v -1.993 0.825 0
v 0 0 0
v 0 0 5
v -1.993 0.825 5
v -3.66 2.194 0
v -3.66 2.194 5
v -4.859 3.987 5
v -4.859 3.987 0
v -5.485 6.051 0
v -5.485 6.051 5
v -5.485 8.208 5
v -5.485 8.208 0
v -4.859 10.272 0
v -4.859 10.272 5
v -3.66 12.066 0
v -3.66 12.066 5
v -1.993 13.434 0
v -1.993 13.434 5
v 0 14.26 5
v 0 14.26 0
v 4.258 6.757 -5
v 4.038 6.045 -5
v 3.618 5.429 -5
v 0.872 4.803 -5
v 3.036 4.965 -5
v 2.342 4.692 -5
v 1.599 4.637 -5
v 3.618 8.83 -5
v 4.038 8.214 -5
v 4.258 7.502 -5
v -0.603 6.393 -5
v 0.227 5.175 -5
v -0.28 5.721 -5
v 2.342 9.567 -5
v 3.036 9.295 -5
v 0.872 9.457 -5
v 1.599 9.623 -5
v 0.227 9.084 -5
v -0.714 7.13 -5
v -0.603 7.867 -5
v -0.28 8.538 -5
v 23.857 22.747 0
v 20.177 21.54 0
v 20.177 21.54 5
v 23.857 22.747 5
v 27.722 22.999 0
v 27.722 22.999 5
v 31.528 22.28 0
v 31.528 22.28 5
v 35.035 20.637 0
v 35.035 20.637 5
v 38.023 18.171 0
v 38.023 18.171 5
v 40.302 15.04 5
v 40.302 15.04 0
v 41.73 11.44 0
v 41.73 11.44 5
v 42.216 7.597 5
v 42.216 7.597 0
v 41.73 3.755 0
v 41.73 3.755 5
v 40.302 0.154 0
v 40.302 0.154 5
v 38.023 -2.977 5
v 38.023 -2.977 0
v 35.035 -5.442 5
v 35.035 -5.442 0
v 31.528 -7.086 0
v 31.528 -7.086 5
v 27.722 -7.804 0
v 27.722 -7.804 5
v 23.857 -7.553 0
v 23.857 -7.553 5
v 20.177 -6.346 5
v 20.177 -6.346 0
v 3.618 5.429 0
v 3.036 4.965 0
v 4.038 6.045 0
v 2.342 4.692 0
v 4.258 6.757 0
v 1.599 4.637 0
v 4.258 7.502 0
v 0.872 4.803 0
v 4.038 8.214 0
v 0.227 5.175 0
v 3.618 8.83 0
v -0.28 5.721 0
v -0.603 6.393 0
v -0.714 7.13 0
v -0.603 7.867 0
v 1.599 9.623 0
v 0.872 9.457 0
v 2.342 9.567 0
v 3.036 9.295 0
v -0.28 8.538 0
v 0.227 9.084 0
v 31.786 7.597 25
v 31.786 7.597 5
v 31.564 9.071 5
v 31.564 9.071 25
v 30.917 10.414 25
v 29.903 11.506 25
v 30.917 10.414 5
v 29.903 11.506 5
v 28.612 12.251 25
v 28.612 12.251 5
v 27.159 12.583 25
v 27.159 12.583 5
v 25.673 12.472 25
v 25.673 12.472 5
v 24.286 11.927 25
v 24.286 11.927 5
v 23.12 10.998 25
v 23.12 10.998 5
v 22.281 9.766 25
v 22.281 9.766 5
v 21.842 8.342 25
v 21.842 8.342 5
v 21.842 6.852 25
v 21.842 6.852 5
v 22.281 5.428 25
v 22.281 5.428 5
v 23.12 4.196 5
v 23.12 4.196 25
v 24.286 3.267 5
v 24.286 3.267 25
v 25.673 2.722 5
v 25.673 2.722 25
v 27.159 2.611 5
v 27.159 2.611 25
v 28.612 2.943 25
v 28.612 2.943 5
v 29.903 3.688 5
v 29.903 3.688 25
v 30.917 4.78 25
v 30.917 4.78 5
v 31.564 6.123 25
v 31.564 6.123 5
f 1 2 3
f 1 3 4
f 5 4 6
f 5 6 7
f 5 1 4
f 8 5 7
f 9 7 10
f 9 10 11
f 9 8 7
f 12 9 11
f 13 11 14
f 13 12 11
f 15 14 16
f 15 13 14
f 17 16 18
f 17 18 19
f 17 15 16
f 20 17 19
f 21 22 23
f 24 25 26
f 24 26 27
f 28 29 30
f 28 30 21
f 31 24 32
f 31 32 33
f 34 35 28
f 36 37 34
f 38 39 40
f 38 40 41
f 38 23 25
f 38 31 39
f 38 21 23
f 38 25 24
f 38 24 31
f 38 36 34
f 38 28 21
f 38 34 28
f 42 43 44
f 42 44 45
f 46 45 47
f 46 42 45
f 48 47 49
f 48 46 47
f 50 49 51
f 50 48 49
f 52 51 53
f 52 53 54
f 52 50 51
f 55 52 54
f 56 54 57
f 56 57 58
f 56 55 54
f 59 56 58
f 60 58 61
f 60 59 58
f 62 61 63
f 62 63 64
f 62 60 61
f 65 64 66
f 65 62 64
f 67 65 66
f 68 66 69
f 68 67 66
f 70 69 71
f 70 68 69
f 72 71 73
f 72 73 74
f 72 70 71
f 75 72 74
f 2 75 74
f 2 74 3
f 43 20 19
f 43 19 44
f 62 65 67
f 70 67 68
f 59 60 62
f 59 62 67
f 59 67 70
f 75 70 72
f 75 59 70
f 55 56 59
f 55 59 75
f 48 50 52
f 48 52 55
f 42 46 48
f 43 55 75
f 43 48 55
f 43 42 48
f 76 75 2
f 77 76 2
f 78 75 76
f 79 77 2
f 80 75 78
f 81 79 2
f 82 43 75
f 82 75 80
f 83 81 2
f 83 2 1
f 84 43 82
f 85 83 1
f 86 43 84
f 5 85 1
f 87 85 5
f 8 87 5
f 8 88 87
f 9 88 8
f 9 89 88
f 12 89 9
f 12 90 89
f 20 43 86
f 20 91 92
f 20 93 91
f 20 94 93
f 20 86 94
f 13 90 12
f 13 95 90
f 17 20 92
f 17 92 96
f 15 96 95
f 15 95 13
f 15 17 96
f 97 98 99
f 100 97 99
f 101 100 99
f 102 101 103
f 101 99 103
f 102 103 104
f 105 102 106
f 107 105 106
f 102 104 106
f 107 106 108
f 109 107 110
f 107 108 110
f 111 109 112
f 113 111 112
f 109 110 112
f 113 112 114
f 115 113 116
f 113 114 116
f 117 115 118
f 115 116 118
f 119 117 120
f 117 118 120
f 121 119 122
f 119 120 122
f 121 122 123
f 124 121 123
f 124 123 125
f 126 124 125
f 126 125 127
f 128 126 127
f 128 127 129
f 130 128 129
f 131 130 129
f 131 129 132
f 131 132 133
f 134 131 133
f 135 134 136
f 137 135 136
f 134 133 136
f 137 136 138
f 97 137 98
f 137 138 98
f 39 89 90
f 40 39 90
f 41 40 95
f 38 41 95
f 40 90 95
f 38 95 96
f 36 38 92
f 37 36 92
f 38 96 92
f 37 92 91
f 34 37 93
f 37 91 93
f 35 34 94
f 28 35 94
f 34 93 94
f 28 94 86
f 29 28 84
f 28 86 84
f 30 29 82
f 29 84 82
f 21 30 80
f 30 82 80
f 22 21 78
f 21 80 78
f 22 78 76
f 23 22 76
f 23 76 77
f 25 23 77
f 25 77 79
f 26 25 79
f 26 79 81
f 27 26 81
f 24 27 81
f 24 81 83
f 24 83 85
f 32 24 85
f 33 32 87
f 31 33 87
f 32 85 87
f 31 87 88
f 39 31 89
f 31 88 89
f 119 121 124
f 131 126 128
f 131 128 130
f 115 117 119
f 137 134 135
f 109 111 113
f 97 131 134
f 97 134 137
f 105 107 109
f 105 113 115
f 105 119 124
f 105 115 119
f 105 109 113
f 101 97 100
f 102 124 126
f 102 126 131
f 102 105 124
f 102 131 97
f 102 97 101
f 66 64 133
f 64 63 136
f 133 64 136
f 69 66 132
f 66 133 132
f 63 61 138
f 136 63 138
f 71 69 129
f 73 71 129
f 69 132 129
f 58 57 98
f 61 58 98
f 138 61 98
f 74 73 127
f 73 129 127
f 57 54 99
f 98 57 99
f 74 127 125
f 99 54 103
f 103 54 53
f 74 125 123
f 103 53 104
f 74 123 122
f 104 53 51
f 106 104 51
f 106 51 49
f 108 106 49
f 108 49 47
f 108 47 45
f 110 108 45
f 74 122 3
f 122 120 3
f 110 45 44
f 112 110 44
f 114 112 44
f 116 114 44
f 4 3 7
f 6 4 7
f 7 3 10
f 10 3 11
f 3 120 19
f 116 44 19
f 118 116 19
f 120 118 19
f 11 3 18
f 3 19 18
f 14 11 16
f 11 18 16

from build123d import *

# Parameters (mm, degrees)
BOSS_EXTRUDE1_DEPTH = 5
SKETCH2_R           = 5
BOSS_EXTRUDE2_DEPTH = 20
SKETCH3_R           = 2.5
BOSS_EXTRUDE3_DEPTH = 5


with BuildPart() as part:
    # Sketch1 → Boss-Extrude1 (new body)
    with BuildSketch(Plane.XY):
        with BuildLine():
            Line((0, 14.259541246), (20.176972809, 21.540123656))
            ThreePointArc((20.176972809, 21.540123656), (42.215740985, 7.597057881), (20.176972809, -6.346007893))
            Line((20.176972809, -6.346007893), (0, 0))
            ThreePointArc((0, 0), (-5.564259015, 7.129770623), (0, 14.259541246))
        make_face()
    extrude(amount=BOSS_EXTRUDE1_DEPTH)

    # Sketch2 → Boss-Extrude2 (add)
    with BuildSketch(Plane.XY.offset(5)):
        with Locations((26.785740985, 7.597057881)):
            Circle(SKETCH2_R)
    extrude(amount=BOSS_EXTRUDE2_DEPTH)

    # Sketch3 → Boss-Extrude3 (add)
    with BuildSketch(Plane(origin=(0, 0, 0), x_dir=(-1, 0, 0), z_dir=(0, 0, -1))):
        with Locations((-1.785740985, 7.129770623)):
            Circle(SKETCH3_R)
    extrude(amount=BOSS_EXTRUDE3_DEPTH)


solid = part.part
